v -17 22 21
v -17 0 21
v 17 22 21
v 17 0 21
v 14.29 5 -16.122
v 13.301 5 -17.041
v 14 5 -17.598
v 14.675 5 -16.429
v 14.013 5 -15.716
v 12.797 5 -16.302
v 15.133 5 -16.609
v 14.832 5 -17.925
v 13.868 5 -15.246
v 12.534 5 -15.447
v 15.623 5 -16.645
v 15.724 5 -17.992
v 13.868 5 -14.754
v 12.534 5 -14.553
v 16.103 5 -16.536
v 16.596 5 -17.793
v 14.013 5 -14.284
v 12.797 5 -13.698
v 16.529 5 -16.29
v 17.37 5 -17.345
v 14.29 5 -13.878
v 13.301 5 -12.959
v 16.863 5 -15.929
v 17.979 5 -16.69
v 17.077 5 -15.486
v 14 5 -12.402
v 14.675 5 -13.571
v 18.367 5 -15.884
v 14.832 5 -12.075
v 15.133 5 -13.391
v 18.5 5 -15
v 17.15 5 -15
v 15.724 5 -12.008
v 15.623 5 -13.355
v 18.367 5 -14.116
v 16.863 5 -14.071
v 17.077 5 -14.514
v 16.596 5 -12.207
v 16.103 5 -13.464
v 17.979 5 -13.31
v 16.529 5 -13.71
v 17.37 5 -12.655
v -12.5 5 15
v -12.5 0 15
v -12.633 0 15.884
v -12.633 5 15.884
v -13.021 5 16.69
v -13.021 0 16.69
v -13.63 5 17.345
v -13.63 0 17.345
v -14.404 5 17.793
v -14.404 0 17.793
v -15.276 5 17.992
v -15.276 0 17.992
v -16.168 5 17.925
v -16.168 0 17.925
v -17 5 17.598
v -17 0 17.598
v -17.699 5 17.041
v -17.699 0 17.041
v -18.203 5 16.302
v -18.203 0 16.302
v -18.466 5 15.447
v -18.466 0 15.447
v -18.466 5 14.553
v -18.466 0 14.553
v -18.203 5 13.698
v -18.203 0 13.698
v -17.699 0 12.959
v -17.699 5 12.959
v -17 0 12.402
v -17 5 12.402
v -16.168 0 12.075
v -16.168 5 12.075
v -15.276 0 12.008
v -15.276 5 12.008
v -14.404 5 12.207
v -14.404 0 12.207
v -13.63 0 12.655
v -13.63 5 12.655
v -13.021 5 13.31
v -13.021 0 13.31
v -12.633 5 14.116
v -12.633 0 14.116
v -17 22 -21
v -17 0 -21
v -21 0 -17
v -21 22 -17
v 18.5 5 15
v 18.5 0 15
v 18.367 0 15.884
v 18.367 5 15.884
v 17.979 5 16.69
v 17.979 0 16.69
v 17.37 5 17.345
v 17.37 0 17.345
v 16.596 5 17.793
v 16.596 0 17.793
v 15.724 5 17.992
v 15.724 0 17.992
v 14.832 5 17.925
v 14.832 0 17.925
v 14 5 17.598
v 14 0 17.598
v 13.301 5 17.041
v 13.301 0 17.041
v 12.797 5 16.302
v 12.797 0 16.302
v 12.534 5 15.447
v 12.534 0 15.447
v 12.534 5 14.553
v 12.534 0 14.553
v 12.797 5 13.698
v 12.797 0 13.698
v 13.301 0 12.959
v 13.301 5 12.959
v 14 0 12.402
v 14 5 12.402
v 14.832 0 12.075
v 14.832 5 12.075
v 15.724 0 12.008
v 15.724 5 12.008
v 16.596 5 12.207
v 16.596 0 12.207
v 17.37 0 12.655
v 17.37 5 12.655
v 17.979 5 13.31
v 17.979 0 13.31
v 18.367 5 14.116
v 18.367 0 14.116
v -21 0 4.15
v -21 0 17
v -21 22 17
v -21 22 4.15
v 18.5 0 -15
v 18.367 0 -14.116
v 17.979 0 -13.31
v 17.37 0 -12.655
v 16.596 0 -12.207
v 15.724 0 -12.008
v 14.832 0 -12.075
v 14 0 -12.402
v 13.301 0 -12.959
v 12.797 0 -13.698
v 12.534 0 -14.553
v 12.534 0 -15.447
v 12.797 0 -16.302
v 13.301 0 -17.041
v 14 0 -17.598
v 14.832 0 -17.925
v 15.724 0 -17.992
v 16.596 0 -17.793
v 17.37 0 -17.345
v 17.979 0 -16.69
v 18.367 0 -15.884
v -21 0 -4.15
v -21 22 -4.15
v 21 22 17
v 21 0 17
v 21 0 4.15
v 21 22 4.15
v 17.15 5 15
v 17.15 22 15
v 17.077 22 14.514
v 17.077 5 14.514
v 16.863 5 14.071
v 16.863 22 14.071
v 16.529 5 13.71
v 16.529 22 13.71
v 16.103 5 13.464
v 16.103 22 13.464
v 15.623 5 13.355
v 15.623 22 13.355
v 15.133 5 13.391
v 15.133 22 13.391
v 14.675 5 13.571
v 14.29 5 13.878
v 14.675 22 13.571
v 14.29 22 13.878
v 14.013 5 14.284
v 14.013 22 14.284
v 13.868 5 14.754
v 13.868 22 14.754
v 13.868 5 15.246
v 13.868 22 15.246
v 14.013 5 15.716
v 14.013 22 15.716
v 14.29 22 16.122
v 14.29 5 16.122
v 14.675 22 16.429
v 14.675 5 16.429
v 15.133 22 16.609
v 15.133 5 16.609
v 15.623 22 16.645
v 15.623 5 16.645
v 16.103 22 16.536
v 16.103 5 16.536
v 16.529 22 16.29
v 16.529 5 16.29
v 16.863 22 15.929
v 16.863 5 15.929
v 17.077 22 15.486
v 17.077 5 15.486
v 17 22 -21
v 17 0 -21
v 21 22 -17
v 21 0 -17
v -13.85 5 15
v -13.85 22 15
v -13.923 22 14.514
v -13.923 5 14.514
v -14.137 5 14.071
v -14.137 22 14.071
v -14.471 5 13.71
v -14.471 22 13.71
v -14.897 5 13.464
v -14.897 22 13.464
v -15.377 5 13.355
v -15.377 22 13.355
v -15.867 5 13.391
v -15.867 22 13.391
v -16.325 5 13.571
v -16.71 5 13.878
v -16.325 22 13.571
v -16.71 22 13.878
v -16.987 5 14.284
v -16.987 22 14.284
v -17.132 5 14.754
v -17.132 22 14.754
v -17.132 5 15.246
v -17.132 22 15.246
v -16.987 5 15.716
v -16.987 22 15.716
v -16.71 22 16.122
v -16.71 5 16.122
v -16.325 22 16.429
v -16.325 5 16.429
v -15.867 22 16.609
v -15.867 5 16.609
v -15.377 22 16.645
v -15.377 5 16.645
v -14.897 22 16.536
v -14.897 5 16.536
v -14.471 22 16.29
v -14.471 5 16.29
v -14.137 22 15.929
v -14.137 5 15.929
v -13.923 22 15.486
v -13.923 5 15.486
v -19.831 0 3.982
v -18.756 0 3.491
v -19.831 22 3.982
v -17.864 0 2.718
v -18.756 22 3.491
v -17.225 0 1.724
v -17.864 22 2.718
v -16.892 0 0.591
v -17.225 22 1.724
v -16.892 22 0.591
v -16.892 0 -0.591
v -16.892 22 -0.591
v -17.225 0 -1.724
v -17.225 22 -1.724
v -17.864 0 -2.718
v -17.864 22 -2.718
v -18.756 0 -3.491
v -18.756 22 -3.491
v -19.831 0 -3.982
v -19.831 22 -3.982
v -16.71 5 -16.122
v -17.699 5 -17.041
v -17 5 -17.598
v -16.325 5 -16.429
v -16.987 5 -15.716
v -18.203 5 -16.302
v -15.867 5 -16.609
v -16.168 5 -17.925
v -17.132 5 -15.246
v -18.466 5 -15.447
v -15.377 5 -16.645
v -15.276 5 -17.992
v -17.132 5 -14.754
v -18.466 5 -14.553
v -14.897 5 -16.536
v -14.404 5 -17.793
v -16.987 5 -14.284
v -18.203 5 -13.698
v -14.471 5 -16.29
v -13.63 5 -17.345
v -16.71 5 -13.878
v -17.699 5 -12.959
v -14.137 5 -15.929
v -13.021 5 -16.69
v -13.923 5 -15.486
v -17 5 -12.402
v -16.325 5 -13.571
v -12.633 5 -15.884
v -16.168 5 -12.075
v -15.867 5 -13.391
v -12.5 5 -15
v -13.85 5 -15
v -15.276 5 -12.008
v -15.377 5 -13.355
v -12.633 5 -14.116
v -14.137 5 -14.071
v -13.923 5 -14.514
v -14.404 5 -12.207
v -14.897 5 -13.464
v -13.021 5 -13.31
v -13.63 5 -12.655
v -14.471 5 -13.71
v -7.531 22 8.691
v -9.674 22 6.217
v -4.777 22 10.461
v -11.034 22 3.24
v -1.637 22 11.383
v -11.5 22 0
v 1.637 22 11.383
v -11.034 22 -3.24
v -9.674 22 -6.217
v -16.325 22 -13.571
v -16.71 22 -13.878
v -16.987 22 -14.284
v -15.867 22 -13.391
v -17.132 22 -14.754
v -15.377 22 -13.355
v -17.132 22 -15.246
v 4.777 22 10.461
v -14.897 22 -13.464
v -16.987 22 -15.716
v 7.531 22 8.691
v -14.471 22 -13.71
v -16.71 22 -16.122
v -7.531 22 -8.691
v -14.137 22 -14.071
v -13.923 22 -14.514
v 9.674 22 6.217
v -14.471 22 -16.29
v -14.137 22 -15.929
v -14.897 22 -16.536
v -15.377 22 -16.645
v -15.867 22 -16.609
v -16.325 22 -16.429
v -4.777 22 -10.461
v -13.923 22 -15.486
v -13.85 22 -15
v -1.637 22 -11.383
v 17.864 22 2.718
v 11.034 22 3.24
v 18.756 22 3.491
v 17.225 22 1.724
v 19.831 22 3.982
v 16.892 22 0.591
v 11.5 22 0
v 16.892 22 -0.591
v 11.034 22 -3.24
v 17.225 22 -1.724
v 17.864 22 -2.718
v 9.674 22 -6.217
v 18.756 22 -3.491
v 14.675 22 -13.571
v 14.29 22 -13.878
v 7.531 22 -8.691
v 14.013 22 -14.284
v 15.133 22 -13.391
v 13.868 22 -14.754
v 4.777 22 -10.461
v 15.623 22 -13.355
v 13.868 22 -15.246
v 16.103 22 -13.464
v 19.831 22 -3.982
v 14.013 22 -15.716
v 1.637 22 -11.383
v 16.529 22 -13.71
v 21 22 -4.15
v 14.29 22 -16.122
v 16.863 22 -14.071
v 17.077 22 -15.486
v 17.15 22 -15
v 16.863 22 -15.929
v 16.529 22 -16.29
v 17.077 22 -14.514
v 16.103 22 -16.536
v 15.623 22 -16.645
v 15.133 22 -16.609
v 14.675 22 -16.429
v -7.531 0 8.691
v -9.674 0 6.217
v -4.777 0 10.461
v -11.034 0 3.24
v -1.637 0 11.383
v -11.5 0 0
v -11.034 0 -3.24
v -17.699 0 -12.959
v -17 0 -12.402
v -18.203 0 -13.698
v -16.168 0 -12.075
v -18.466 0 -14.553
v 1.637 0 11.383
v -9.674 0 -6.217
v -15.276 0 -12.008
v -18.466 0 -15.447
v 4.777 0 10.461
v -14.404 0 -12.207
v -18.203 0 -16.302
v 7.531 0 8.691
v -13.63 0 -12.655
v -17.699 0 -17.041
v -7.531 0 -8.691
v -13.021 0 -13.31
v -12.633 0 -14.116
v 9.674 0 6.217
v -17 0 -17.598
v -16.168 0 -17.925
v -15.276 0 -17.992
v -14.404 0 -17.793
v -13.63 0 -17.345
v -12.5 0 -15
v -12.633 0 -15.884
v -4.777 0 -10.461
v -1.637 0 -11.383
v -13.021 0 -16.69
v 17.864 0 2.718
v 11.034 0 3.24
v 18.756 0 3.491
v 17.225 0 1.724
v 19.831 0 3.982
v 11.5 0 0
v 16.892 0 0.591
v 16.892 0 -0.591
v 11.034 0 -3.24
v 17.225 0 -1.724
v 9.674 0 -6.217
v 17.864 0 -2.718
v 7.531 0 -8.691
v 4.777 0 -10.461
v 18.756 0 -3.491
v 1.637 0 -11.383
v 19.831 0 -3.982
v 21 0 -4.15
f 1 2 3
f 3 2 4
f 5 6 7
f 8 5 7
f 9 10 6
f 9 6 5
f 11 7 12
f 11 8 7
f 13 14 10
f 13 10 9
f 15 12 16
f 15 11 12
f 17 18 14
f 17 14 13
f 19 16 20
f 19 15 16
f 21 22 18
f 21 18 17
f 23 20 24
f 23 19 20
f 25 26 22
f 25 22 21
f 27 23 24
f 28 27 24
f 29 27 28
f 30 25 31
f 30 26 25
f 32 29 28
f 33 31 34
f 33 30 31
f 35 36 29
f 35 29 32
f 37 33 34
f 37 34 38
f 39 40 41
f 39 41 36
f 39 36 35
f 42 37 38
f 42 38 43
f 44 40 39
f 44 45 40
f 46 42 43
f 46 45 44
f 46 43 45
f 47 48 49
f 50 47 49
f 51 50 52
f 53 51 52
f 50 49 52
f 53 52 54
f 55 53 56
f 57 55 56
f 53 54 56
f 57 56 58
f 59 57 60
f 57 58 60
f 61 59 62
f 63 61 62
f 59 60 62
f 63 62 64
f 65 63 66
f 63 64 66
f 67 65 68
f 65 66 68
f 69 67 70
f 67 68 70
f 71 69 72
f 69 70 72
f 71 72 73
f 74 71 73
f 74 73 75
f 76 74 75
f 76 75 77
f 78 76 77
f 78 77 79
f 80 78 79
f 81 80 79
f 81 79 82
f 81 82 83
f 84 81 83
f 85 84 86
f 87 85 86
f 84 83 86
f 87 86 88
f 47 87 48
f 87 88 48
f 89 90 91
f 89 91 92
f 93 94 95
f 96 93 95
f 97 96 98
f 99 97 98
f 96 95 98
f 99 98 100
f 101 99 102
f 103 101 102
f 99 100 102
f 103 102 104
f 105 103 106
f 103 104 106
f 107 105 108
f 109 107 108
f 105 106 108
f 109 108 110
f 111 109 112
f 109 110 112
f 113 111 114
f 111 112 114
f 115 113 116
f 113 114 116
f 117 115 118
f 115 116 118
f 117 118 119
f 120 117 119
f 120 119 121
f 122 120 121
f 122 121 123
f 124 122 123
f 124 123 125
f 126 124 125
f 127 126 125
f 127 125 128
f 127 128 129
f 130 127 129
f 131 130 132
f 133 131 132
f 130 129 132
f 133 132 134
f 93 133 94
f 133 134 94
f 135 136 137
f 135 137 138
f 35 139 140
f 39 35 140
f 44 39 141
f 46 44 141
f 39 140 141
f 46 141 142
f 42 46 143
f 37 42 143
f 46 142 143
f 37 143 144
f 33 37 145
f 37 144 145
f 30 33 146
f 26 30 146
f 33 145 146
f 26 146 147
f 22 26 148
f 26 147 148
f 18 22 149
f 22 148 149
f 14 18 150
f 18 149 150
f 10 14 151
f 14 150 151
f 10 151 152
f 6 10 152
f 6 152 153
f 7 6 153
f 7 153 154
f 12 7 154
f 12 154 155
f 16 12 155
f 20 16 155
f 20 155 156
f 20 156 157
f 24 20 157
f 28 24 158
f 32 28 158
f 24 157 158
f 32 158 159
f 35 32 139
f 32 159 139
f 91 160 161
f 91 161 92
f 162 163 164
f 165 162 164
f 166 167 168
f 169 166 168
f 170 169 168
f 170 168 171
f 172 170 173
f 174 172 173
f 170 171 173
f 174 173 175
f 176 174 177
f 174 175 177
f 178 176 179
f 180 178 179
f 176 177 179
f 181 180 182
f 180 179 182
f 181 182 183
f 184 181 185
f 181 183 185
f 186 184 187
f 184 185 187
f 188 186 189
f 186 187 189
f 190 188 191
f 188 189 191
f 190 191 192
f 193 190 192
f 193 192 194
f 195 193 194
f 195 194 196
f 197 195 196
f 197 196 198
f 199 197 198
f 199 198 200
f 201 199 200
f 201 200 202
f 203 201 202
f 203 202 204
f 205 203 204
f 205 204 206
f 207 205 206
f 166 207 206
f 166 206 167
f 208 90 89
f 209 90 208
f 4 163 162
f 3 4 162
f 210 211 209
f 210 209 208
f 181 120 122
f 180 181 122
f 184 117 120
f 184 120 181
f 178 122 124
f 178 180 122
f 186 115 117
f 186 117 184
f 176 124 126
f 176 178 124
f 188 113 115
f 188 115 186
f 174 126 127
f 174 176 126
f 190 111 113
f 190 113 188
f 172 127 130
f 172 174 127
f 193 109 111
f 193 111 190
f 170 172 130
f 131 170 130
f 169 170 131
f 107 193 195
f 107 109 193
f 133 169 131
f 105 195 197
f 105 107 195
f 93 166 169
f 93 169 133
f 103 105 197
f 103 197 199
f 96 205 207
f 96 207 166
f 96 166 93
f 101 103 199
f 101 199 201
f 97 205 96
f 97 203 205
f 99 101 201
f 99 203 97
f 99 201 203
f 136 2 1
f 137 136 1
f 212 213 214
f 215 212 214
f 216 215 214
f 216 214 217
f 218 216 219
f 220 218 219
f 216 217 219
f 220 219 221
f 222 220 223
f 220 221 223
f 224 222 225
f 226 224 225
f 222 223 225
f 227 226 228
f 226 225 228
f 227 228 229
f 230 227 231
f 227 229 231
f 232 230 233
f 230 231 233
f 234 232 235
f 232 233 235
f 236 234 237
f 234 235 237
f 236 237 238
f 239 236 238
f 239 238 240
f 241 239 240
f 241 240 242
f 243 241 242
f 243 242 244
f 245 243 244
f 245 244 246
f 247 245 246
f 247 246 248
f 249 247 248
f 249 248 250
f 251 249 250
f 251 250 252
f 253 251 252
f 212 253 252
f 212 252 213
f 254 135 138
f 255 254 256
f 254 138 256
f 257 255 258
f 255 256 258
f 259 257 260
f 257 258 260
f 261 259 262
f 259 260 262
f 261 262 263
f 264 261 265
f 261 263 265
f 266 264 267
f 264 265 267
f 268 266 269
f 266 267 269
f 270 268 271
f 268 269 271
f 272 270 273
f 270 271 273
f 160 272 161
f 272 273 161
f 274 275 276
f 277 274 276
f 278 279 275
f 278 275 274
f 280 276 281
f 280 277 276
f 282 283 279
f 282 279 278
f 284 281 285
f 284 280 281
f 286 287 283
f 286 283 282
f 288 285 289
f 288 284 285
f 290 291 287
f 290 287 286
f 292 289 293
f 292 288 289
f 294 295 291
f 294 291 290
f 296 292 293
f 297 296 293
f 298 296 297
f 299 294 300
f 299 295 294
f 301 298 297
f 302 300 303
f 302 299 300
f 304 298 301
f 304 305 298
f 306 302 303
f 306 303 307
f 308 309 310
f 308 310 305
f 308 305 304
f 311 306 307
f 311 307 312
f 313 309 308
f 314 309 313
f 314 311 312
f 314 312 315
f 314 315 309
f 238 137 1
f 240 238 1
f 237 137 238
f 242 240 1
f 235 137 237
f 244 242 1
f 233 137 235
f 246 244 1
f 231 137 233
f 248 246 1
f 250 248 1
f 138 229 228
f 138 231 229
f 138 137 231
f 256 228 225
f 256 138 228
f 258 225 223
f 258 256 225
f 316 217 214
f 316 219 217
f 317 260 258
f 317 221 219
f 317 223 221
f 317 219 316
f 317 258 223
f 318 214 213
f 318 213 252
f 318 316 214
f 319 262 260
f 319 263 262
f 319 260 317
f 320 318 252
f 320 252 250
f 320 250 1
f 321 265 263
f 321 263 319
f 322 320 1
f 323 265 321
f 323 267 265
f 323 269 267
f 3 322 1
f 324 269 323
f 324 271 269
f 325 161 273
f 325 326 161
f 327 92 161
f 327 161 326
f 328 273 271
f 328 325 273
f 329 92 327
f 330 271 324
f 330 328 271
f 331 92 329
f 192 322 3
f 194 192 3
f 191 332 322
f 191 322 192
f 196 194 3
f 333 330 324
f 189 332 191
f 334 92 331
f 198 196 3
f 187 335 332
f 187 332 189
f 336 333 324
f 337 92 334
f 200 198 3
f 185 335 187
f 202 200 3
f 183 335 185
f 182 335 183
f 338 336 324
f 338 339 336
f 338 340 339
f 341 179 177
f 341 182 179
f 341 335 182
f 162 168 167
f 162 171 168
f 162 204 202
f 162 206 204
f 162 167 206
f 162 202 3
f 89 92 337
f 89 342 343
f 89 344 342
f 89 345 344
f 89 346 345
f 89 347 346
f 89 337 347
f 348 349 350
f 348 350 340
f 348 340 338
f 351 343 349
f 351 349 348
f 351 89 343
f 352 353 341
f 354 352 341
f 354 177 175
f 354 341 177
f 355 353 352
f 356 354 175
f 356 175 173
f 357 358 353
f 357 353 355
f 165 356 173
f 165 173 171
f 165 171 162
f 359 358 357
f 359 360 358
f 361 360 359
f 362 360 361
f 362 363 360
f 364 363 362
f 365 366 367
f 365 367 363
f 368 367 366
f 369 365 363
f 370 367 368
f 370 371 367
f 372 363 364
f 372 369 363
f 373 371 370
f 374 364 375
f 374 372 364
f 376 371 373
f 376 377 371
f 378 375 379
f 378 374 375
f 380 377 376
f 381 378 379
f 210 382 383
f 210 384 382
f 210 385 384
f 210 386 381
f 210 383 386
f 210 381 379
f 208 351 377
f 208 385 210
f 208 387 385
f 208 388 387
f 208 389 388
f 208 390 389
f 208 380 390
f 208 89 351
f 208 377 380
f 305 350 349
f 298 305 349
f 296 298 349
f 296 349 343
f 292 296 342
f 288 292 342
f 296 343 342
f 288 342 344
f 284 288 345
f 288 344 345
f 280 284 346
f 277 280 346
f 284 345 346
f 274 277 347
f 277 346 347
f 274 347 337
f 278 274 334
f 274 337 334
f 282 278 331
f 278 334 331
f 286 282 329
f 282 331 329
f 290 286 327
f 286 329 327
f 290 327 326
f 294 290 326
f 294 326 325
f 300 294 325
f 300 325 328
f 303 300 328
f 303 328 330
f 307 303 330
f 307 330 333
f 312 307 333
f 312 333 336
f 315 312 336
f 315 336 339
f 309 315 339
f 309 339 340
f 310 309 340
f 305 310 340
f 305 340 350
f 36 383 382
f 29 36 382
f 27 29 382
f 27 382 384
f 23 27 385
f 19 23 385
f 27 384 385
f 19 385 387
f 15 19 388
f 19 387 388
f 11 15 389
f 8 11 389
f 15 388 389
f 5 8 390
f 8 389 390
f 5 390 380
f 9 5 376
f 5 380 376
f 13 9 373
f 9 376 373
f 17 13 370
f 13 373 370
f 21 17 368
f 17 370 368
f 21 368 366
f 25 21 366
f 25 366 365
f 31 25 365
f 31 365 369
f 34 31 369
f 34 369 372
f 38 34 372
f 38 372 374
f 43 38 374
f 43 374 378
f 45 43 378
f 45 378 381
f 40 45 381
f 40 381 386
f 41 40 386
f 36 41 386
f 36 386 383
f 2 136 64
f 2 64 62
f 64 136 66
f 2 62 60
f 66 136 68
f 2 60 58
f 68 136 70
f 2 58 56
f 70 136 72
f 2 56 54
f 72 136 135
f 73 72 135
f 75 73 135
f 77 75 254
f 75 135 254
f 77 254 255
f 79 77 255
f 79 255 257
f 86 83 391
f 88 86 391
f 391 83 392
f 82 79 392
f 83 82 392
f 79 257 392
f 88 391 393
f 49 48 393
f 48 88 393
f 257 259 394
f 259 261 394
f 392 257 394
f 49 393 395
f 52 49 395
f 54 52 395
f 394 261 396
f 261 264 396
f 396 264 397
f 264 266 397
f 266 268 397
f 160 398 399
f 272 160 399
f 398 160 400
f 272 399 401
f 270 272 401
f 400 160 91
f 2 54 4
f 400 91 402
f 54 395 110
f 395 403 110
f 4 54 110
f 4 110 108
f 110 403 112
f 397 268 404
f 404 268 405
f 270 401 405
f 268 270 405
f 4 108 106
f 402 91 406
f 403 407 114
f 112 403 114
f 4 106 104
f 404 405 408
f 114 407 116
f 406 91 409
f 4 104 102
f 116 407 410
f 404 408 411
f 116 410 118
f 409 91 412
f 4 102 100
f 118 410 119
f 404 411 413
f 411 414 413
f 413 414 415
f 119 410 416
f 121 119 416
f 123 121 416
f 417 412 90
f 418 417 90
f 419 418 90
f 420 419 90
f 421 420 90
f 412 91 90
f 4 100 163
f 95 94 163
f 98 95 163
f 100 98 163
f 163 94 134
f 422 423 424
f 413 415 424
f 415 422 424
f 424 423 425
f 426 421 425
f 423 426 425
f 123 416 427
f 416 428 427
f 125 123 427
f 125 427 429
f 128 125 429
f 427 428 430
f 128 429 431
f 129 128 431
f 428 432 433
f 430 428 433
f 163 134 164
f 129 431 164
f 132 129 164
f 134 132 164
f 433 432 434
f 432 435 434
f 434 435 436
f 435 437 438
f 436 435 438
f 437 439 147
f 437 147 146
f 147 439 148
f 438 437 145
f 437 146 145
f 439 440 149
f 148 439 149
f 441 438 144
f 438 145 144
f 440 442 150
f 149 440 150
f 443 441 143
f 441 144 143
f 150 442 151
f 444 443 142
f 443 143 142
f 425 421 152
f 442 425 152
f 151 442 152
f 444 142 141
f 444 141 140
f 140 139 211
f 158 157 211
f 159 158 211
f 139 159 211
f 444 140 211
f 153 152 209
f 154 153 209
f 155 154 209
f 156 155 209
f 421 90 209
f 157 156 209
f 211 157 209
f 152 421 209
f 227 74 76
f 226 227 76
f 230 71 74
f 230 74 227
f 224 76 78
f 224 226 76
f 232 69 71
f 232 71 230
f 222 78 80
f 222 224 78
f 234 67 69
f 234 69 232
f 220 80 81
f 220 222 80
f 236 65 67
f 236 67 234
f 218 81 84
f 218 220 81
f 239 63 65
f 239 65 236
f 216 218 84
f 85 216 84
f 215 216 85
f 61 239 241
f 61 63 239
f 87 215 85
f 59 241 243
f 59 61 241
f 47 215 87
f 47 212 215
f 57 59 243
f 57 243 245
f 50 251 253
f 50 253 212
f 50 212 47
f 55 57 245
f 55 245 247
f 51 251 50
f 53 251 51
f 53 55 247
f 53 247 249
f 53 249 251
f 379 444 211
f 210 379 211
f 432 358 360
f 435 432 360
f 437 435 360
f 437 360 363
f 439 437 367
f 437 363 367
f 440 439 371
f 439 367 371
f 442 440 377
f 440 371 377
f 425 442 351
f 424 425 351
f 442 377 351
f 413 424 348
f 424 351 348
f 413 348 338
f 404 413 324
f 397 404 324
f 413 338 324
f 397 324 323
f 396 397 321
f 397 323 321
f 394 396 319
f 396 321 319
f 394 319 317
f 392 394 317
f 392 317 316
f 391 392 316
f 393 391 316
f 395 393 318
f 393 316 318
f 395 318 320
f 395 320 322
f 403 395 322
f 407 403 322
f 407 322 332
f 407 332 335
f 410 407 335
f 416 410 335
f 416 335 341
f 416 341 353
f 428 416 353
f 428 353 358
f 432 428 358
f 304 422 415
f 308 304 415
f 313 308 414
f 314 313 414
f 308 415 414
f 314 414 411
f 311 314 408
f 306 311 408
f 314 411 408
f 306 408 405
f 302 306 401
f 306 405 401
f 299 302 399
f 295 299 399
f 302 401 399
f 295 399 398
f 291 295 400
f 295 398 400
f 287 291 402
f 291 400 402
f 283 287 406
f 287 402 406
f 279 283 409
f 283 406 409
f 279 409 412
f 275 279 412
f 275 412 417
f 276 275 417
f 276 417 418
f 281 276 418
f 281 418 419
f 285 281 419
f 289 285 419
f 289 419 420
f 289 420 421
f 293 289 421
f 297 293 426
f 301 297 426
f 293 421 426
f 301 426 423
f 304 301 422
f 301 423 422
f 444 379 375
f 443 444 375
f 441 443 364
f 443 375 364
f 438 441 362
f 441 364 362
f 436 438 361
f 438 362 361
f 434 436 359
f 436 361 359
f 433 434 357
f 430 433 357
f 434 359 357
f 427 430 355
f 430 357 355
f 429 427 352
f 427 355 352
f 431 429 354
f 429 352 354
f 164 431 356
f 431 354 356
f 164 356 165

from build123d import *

# Parameters (mm, degrees)
SKETCH1_W                      = 42
SKETCH1_H                      = 42
BOSS_EXTRUDE1_DEPTH            = 22
CUT_EXTRUDE1_REACH             = 24
SKETCH2_R                      = 11.5
SKETCH2_R_2                    = 1.65
CUT_EXTRUDE1_DIRECTION_2_DEPTH = 1
CHAMFER1_SIZE                  = 4
SKETCH3_R                      = 3
CUT_EXTRUDE2_DEPTH             = 1
CUT_EXTRUDE2_DEPTH_BACK        = 5
CUT_EXTRUDE3_REACH             = 24
SKETCH4_R                      = 4.15
CUT_EXTRUDE3_DIRECTION_2_DEPTH = 1


with BuildPart() as part:
    # Sketch1 → Boss-Extrude1 (new body)
    with BuildSketch(Plane(origin=(0, 0, 0), x_dir=(1, 0, 0), z_dir=(0, 1, 0))):
        Rectangle(SKETCH1_W, SKETCH1_H)
    extrude(amount=BOSS_EXTRUDE1_DEPTH)

    # Sketch2 → Cut-Extrude1 (cut, up to next)
    with BuildSketch(Plane(origin=(0, 22, 0), x_dir=(1, 0, 0), z_dir=(0, 1, 0)), mode=Mode.PRIVATE) as cut_extrude1_sk1:
        Circle(SKETCH2_R)
    cut_extrude1_tool1 = extrude(cut_extrude1_sk1.sketch, amount=-CUT_EXTRUDE1_REACH, mode=Mode.PRIVATE) & part.part
    add(cut_extrude1_tool1.solids().sort_by_distance((0, 22, 0))[0], mode=Mode.SUBTRACT)
    # Sketch2 → Cut-Extrude1 (cut, up to next)
    with BuildSketch(Plane(origin=(0, 22, 0), x_dir=(1, 0, 0), z_dir=(0, 1, 0)), mode=Mode.PRIVATE) as cut_extrude1_sk2:
        with Locations((-15.5, 15)):
            Circle(SKETCH2_R_2)
    cut_extrude1_tool2 = extrude(cut_extrude1_sk2.sketch, amount=-CUT_EXTRUDE1_REACH, mode=Mode.PRIVATE) & part.part
    add(cut_extrude1_tool2.solids().sort_by_distance((-15.5, 22, -15))[0], mode=Mode.SUBTRACT)
    # Sketch2 → Cut-Extrude1 (cut, up to next)
    with BuildSketch(Plane(origin=(0, 22, 0), x_dir=(1, 0, 0), z_dir=(0, 1, 0)), mode=Mode.PRIVATE) as cut_extrude1_sk3:
        with Locations((15.5, 15)):
            Circle(SKETCH2_R_2)
    cut_extrude1_tool3 = extrude(cut_extrude1_sk3.sketch, amount=-CUT_EXTRUDE1_REACH, mode=Mode.PRIVATE) & part.part
    add(cut_extrude1_tool3.solids().sort_by_distance((15.5, 22, -15))[0], mode=Mode.SUBTRACT)
    # Sketch2 → Cut-Extrude1 (cut, up to next)
    with BuildSketch(Plane(origin=(0, 22, 0), x_dir=(1, 0, 0), z_dir=(0, 1, 0)), mode=Mode.PRIVATE) as cut_extrude1_sk4:
        with Locations((15.5, -15)):
            Circle(SKETCH2_R_2)
    cut_extrude1_tool4 = extrude(cut_extrude1_sk4.sketch, amount=-CUT_EXTRUDE1_REACH, mode=Mode.PRIVATE) & part.part
    add(cut_extrude1_tool4.solids().sort_by_distance((15.5, 22, 15))[0], mode=Mode.SUBTRACT)
    # Sketch2 → Cut-Extrude1 (cut, up to next)
    with BuildSketch(Plane(origin=(0, 22, 0), x_dir=(1, 0, 0), z_dir=(0, 1, 0)), mode=Mode.PRIVATE) as cut_extrude1_sk5:
        with Locations((-15.5, -15)):
            Circle(SKETCH2_R_2)
    cut_extrude1_tool5 = extrude(cut_extrude1_sk5.sketch, amount=-CUT_EXTRUDE1_REACH, mode=Mode.PRIVATE) & part.part
    add(cut_extrude1_tool5.solids().sort_by_distance((-15.5, 22, 15))[0], mode=Mode.SUBTRACT)

    # Sketch2 → Cut-Extrude1 direction 2 (cut)
    with BuildSketch(Plane(origin=(0, 22, 0), x_dir=(1, 0, 0), z_dir=(0, 1, 0))):
        Circle(SKETCH2_R)
        with Locations((-15.5, 15)):
            Circle(SKETCH2_R_2)
        with Locations((15.5, 15)):
            Circle(SKETCH2_R_2)
        with Locations((15.5, -15)):
            Circle(SKETCH2_R_2)
        with Locations((-15.5, -15)):
            Circle(SKETCH2_R_2)
    extrude(amount=CUT_EXTRUDE1_DIRECTION_2_DEPTH, mode=Mode.SUBTRACT)

    # Chamfer1
    chamfer1_edges = [part.edges().sort_by_distance(p)[0] for p in [
        (21, 11, 21),
        (-21, 11, 21),
        (-21, 11, -21),
        (21, 11, -21),
    ]]
    chamfer(chamfer1_edges, length=CHAMFER1_SIZE)

    # Sketch3 → Cut-Extrude2 (cut, two sides)
    with BuildSketch(Plane.XZ) as cut_extrude2_sk:
        with Locations((-15.5, 15)):
            Circle(SKETCH3_R)
        with Locations((15.5, 15)):
            Circle(SKETCH3_R)
        with Locations((15.5, -15)):
            Circle(SKETCH3_R)
        with Locations((-15.5, -15)):
            Circle(SKETCH3_R)
    extrude(amount=CUT_EXTRUDE2_DEPTH, mode=Mode.SUBTRACT)
    extrude(cut_extrude2_sk.sketch, amount=-CUT_EXTRUDE2_DEPTH_BACK, mode=Mode.SUBTRACT)

    # Sketch4 → Cut-Extrude3 (cut, up to next)
    with BuildSketch(Plane(origin=(0, 22, 0), x_dir=(1, 0, 0), z_dir=(0, 1, 0)), mode=Mode.PRIVATE) as cut_extrude3_sk1:
        with Locations((-21, 0)):
            Circle(SKETCH4_R)
    cut_extrude3_tool1 = extrude(cut_extrude3_sk1.sketch, amount=-CUT_EXTRUDE3_REACH, mode=Mode.PRIVATE) & part.part
    add(cut_extrude3_tool1.solids().sort_by_distance((-21, 22, 0))[0], mode=Mode.SUBTRACT)
    # Sketch4 → Cut-Extrude3 (cut, up to next)
    with BuildSketch(Plane(origin=(0, 22, 0), x_dir=(1, 0, 0), z_dir=(0, 1, 0)), mode=Mode.PRIVATE) as cut_extrude3_sk2:
        with Locations((21, 0)):
            Circle(SKETCH4_R)
    cut_extrude3_tool2 = extrude(cut_extrude3_sk2.sketch, amount=-CUT_EXTRUDE3_REACH, mode=Mode.PRIVATE) & part.part
    add(cut_extrude3_tool2.solids().sort_by_distance((21, 22, 0))[0], mode=Mode.SUBTRACT)

    # Sketch4 → Cut-Extrude3 direction 2 (cut)
    with BuildSketch(Plane(origin=(0, 22, 0), x_dir=(1, 0, 0), z_dir=(0, 1, 0))):
        with Locations((-21, 0)):
            Circle(SKETCH4_R)
        with Locations((21, 0)):
            Circle(SKETCH4_R)
    extrude(amount=CUT_EXTRUDE3_DIRECTION_2_DEPTH, mode=Mode.SUBTRACT)


solid = part.part
